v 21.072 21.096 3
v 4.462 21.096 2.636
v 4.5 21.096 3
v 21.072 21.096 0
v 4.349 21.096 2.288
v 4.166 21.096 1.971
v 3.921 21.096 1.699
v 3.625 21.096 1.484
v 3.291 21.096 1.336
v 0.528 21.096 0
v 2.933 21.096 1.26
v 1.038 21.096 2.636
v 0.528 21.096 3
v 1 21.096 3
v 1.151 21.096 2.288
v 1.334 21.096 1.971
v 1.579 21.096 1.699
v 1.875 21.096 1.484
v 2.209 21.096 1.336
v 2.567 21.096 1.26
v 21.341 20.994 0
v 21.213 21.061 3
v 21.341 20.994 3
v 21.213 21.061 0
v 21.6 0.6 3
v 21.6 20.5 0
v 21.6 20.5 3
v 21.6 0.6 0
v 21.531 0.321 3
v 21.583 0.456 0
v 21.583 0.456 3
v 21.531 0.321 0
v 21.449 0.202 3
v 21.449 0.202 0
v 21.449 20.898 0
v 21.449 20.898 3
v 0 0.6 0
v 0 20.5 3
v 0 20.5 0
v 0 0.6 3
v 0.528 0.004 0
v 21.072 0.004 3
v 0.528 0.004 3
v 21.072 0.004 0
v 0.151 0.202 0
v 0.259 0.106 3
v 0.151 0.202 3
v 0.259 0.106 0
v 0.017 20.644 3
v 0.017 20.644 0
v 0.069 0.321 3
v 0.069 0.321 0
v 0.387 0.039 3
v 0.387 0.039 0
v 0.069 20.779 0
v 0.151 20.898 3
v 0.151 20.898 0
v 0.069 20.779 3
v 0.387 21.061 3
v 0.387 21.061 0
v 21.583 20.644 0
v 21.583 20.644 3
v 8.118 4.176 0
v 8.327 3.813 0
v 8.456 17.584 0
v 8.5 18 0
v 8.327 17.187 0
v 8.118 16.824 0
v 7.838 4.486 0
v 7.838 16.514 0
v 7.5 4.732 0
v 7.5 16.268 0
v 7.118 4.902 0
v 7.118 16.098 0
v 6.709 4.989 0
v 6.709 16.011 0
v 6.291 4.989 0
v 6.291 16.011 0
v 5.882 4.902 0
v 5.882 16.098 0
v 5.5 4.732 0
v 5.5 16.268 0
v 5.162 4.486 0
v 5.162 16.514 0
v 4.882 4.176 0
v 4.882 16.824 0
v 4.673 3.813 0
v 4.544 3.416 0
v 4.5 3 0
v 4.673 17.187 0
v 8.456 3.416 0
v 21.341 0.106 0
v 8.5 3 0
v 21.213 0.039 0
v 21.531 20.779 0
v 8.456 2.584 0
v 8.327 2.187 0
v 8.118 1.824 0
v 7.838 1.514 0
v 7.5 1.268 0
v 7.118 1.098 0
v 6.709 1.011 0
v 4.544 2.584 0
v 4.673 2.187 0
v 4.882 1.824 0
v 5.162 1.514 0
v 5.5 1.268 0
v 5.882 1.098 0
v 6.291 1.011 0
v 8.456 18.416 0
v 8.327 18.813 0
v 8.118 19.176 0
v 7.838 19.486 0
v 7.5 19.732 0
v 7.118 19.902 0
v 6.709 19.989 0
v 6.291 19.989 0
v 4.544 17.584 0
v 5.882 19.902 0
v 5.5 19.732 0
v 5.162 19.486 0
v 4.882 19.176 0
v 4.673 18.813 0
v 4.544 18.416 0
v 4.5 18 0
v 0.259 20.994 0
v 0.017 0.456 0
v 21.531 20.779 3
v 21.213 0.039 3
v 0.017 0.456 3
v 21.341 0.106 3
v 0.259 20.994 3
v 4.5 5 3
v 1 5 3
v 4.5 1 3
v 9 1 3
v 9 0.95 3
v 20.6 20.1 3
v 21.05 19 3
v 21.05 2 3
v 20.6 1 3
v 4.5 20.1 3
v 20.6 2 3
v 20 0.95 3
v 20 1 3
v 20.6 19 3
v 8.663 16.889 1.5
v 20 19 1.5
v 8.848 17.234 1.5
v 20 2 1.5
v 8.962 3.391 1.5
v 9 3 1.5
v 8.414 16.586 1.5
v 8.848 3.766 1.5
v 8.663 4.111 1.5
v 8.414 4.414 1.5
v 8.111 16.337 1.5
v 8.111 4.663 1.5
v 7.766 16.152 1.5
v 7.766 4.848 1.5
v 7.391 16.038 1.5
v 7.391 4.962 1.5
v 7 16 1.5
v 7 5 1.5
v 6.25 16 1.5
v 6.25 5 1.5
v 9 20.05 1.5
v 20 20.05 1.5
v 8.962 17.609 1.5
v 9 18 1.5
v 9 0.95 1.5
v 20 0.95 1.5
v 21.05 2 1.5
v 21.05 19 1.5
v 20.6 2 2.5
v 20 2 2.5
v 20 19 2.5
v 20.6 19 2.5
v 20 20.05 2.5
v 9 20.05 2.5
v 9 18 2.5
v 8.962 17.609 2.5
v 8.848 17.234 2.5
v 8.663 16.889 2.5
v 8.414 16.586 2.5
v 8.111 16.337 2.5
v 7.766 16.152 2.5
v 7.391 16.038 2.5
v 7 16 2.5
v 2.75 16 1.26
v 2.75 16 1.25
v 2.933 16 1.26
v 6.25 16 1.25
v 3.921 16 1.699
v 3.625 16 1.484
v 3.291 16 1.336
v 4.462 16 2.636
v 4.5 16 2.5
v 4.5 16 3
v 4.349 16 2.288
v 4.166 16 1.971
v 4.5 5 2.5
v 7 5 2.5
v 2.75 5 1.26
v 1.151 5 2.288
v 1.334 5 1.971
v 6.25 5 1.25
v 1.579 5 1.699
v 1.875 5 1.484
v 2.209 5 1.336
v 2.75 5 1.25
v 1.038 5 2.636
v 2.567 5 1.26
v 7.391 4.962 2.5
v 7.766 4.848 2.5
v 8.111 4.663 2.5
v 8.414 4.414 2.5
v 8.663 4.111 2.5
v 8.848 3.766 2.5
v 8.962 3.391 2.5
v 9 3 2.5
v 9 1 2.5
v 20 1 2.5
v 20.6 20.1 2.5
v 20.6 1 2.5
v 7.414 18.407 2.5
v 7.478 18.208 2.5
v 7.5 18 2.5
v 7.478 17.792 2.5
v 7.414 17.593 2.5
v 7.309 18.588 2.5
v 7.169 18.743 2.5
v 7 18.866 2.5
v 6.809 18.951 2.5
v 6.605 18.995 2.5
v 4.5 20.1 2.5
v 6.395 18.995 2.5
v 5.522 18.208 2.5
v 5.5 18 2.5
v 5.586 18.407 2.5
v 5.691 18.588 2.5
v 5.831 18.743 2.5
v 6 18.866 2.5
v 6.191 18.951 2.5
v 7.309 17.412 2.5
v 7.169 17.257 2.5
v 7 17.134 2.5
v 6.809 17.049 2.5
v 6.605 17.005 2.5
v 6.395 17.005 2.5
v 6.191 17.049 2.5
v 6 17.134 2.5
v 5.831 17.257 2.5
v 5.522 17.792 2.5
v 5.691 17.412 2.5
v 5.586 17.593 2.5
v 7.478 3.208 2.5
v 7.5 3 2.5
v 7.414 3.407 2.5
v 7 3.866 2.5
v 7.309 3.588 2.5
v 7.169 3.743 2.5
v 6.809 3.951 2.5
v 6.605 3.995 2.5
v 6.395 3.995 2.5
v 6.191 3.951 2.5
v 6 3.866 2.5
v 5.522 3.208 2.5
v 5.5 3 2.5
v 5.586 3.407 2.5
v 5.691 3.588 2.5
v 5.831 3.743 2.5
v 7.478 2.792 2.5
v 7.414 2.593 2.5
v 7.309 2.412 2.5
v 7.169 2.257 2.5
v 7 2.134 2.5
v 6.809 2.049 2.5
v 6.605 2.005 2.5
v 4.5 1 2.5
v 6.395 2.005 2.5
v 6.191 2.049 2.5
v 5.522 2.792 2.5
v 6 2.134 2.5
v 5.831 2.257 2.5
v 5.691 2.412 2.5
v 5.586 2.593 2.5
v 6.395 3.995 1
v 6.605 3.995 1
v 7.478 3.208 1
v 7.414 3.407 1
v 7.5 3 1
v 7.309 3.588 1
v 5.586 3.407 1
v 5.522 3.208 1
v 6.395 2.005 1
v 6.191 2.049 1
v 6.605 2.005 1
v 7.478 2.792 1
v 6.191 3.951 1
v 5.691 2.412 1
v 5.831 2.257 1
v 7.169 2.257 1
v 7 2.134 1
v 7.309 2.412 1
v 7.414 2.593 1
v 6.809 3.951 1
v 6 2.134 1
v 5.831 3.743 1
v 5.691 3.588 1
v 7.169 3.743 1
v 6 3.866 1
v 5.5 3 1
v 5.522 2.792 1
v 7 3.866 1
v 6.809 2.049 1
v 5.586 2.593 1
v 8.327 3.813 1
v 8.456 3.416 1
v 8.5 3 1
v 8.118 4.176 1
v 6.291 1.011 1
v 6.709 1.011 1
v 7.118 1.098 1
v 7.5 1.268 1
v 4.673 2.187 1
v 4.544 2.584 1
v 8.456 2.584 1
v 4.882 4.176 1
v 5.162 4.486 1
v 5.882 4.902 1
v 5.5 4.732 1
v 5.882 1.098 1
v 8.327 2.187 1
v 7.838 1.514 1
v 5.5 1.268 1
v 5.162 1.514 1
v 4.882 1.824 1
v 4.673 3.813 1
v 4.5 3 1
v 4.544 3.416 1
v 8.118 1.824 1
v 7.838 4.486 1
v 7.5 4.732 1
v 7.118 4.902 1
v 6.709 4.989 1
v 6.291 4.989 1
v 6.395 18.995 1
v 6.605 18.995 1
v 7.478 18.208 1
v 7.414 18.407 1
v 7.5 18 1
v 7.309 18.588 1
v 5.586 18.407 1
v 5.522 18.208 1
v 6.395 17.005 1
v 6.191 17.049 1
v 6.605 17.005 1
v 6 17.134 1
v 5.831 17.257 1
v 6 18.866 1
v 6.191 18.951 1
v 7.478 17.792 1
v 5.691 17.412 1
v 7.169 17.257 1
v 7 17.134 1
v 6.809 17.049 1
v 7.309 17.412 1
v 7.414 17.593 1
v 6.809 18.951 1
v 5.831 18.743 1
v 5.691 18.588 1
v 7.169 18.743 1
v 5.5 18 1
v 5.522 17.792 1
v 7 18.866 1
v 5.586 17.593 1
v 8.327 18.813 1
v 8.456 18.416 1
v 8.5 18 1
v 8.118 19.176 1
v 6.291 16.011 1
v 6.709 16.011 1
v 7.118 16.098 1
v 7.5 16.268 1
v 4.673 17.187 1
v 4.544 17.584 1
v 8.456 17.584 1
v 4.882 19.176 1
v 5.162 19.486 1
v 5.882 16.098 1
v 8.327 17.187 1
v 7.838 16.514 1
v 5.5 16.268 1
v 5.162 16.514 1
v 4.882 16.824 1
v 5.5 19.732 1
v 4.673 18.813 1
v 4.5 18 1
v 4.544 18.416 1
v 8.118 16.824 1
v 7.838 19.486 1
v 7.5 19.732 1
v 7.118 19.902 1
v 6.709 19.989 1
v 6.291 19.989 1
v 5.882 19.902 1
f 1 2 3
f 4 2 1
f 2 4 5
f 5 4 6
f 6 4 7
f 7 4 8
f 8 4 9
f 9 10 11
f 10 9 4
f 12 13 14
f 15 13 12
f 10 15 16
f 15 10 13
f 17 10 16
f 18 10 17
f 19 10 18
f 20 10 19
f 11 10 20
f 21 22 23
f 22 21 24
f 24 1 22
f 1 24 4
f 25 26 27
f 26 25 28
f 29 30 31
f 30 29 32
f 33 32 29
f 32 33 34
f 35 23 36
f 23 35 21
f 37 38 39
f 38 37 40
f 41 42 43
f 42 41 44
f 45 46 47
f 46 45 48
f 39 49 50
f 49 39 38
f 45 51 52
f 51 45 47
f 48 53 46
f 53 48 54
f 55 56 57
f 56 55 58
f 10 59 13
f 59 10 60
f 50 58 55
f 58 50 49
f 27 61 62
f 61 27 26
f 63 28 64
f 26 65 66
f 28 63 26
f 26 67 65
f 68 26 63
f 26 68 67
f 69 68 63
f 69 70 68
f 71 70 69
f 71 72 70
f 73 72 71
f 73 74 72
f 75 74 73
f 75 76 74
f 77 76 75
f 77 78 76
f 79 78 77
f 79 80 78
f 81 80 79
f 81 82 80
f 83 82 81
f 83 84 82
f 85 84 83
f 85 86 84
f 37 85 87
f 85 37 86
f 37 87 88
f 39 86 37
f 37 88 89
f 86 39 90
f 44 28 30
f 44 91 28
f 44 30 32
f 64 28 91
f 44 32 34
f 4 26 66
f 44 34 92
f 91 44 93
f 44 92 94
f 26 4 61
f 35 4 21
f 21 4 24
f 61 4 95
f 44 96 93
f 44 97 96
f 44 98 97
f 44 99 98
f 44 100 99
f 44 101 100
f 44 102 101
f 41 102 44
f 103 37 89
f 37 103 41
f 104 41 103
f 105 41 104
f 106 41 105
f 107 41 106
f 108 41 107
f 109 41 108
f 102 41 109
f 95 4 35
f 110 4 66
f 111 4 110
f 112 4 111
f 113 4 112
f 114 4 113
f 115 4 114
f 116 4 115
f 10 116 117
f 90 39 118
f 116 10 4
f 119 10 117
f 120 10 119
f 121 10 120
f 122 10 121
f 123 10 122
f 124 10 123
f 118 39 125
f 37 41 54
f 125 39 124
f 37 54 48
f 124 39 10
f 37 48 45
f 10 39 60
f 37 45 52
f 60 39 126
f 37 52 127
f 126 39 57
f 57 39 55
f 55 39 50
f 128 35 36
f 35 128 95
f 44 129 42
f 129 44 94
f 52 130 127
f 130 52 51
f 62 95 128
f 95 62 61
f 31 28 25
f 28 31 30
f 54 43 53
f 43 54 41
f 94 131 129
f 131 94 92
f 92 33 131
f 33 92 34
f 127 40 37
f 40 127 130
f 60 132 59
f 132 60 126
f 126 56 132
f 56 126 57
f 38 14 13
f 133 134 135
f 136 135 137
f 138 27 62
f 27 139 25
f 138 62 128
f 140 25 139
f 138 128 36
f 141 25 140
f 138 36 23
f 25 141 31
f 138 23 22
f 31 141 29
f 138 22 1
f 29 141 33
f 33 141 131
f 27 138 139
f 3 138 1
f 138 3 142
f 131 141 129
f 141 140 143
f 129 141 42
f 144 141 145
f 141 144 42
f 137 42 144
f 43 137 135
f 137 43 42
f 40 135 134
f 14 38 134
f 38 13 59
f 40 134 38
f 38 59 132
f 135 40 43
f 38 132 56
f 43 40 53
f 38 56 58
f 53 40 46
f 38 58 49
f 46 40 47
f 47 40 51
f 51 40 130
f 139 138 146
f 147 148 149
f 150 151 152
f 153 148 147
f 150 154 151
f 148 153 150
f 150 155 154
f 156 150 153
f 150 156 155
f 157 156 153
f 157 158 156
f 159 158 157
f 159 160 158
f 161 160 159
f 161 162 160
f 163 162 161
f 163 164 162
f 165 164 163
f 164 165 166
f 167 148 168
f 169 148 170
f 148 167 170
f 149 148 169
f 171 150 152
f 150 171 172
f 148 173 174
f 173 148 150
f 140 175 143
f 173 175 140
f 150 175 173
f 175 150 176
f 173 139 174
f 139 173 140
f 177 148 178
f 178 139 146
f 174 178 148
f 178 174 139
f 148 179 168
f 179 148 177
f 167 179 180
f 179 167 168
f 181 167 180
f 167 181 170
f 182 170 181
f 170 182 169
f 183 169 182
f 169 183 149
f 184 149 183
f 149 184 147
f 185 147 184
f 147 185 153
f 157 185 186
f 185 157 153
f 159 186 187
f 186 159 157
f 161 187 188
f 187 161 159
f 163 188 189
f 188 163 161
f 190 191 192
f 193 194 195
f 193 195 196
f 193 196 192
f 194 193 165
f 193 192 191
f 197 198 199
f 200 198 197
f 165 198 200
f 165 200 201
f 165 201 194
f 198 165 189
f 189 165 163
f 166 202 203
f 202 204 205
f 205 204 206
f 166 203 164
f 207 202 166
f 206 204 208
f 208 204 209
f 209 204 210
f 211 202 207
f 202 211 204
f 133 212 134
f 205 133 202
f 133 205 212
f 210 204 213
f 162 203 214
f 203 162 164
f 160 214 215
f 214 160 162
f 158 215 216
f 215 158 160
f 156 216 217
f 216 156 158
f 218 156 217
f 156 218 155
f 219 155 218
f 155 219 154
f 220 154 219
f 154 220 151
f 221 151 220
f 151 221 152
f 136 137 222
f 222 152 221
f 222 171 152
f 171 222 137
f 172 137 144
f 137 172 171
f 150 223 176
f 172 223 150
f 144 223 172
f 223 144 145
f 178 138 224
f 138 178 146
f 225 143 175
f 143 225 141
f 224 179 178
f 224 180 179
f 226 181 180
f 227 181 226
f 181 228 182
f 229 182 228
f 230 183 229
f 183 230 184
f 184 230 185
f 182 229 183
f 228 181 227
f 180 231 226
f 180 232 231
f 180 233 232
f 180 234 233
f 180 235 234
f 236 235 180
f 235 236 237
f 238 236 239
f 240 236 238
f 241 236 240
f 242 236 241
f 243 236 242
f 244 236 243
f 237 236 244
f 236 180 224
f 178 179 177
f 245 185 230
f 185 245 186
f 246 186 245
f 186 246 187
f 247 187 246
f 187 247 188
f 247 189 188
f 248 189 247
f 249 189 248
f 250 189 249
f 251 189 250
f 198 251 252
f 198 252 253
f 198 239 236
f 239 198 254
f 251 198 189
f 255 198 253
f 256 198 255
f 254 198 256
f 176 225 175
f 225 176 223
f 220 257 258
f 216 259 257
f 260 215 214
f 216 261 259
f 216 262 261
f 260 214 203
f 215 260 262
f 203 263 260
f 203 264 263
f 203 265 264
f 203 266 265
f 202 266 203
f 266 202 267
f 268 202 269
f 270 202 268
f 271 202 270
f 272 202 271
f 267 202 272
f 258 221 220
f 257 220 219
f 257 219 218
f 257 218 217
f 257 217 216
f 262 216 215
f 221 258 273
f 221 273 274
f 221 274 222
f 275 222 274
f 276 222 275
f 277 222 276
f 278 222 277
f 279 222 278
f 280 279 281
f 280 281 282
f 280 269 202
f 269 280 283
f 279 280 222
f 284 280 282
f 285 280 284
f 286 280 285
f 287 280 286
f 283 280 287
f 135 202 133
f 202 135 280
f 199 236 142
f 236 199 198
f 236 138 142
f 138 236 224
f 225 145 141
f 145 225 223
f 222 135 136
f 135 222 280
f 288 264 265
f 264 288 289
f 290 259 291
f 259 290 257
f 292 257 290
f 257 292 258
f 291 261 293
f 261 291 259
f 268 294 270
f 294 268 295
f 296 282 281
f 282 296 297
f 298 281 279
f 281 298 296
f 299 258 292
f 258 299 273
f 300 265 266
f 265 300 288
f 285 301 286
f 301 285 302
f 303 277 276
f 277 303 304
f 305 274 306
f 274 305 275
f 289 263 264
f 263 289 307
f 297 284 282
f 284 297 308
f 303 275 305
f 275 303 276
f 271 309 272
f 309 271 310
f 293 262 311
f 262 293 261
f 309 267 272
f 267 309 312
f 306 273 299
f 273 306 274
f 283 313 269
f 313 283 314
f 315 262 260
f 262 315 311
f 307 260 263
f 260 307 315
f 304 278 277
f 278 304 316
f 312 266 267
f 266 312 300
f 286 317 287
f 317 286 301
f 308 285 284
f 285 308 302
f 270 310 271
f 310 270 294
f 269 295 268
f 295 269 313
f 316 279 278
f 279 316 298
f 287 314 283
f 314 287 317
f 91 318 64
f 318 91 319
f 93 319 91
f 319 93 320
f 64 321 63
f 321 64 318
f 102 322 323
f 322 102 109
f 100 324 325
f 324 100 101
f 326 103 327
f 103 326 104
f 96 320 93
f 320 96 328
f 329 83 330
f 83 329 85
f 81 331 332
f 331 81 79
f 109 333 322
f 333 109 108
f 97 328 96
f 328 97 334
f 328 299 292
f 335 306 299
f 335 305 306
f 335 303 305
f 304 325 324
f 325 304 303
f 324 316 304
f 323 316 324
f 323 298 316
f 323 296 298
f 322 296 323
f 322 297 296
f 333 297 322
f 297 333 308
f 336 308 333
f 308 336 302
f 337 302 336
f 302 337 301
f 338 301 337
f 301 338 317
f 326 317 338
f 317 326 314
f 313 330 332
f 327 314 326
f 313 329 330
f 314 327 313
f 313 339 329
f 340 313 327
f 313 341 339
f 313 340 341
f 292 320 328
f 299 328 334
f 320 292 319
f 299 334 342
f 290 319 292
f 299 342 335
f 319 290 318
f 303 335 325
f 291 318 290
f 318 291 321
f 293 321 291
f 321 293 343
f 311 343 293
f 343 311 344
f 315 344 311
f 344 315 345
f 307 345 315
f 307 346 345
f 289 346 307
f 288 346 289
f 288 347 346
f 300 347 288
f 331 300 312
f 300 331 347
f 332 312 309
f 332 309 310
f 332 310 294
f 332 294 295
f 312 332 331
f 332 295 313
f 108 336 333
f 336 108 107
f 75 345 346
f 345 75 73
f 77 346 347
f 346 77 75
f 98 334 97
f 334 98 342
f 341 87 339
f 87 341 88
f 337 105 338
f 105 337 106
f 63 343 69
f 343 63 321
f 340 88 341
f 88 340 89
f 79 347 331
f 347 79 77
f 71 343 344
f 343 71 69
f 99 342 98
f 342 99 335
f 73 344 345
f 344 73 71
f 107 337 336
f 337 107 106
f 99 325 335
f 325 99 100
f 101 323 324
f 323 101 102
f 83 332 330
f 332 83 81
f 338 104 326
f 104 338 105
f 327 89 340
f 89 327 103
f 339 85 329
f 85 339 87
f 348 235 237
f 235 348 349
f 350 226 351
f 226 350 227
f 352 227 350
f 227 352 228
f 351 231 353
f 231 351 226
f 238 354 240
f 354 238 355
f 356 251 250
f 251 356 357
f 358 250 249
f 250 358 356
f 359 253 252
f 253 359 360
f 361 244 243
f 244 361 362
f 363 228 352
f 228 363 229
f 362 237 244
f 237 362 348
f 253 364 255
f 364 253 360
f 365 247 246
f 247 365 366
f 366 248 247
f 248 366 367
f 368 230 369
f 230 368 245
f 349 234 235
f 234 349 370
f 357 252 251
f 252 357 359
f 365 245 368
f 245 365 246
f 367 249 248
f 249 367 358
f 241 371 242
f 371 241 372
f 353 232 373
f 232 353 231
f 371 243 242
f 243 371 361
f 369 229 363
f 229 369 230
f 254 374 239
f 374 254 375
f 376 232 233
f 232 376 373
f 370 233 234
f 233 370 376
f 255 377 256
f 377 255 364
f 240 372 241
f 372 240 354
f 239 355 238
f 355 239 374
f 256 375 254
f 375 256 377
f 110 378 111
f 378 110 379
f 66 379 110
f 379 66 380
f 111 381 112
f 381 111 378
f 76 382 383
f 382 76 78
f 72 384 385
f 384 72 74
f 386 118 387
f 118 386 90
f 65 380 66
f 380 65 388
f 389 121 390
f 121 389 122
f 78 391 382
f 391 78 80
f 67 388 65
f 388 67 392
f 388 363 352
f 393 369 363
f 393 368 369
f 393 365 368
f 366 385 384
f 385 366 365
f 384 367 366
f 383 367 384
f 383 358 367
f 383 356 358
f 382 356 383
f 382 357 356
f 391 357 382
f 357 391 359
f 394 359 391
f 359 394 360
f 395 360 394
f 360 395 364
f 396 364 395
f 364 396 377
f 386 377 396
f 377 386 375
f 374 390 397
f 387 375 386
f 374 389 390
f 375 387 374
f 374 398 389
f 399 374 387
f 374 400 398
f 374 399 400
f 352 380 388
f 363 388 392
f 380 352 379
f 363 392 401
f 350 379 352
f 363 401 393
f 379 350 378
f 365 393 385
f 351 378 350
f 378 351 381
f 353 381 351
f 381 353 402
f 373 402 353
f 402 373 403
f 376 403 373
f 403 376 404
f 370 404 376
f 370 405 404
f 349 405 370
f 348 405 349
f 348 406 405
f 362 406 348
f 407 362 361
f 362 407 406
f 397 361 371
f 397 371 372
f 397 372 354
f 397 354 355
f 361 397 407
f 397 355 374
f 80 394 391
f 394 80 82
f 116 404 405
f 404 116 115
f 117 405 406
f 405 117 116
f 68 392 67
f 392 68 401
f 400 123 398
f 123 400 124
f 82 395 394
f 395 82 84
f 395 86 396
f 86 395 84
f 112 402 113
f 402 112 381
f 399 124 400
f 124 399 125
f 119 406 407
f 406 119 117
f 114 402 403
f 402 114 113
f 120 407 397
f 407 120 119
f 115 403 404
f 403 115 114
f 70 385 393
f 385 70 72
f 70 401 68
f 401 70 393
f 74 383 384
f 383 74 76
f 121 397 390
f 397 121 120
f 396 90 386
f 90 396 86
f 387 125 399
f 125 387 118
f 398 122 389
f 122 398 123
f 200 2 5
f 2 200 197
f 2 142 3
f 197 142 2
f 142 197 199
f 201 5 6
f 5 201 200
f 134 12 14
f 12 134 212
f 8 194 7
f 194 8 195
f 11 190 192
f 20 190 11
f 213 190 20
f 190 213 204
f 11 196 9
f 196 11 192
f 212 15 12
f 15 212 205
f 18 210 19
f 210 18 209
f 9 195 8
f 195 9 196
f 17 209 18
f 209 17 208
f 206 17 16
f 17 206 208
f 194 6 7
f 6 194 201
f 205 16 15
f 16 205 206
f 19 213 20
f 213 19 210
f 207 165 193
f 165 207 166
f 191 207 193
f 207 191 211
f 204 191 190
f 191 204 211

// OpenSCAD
// file: roundedcube.scad
/* https://danielupshaw.com/openscad-rounded-corners/ */

module roundedcube(size = [1, 1, 1], center = false, radius = 0.5, apply_to = "all")
{
	// If single value, convert to [x, y, z] vector
	size = (size[0] == undef) ? [size, size, size] : size;

	translate_min = radius;
	translate_xmax = size[0] - radius;
	translate_ymax = size[1] - radius;
	translate_zmax = size[2] - radius;

	diameter = radius * 2;

	obj_translate = (center == false) ?
		[0, 0, 0] : [
			-(size[0] / 2),
			-(size[1] / 2),
			-(size[2] / 2)
		];

	translate(v = obj_translate) {
		hull() {
			for (translate_x = [translate_min, translate_xmax]) {
				x_at = (translate_x == translate_min) ? "min" : "max";
				for (translate_y = [translate_min, translate_ymax]) {
					y_at = (translate_y == translate_min) ? "min" : "max";
					for (translate_z = [translate_min, translate_zmax]) {
						z_at = (translate_z == translate_min) ? "min" : "max";

						translate(v = [translate_x, translate_y, translate_z])
						if (
							(apply_to == "all") ||
							(apply_to == "xmin" && x_at == "min") || (apply_to == "xmax" && x_at == "max") ||
							(apply_to == "ymin" && y_at == "min") || (apply_to == "ymax" && y_at == "max") ||
							(apply_to == "zmin" && z_at == "min") || (apply_to == "zmax" && z_at == "max")
						) {
							sphere(r = radius);
						} else {
							rotate = 
								(apply_to == "xmin" || apply_to == "xmax" || apply_to == "x") ? [0, 90, 0] : (
								(apply_to == "ymin" || apply_to == "ymax" || apply_to == "y") ? [90, 90, 0] :
								[0, 0, 0]
							);
							rotate(a = rotate)
							cylinder(h = diameter, r = radius, center = true);
						}
					}
				}
			}
		}
	}
}
// file: params.scad
x_board=16.1;
y_board=19.1;
z_board=1;
d_cable=3.5;
ep_box=1;

x_box=x_board+d_cable+ep_box*2;
y_box=y_board+ep_box*2;
z_box=8;
z_cover=5;
z_base=z_box-z_cover;
// main file
$fs = 0.15;

include <params.scad>
include <roundedcube.scad>
difference() {
     roundedcube([x_box, y_box, z_box], false, 0.6, "zmax");
     translate([-1, -1, z_base]) cube([x_box+2, y_box+2, z_box]);
     /* hole for board */
     translate([0, 0, ep_box+0.5]) linear_extrude(height = z_base) import("board.dxf", layer="hole_board");
     translate([d_cable+ep_box, ep_box, z_base-z_board/2]) cube([x_board, y_board, z_board/2+1]);
     /* hole for screws */
     translate([d_cable+ep_box+2, ep_box+2, -1]) cylinder(d=2,h=z_base+2);
     translate([d_cable+ep_box+2, ep_box+2, -1]) cylinder(d=4,h=1+1);
     translate([d_cable+ep_box+2, ep_box+2+15, -1]) cylinder(d=2,h=z_base+2);
     translate([d_cable+ep_box+2, ep_box+2+15, -1]) cylinder(d=4,h=1+1);
     /* hole for cable */
     translate([d_cable/2+ep_box, ep_box+4, z_base]) rotate([-90, 0, 0]) cylinder(d=d_cable, h=y_box+1);
     translate([d_cable/2+ep_box, ep_box+4, z_base-d_cable/2]) cube([d_cable, 11, d_cable/2]);
};
